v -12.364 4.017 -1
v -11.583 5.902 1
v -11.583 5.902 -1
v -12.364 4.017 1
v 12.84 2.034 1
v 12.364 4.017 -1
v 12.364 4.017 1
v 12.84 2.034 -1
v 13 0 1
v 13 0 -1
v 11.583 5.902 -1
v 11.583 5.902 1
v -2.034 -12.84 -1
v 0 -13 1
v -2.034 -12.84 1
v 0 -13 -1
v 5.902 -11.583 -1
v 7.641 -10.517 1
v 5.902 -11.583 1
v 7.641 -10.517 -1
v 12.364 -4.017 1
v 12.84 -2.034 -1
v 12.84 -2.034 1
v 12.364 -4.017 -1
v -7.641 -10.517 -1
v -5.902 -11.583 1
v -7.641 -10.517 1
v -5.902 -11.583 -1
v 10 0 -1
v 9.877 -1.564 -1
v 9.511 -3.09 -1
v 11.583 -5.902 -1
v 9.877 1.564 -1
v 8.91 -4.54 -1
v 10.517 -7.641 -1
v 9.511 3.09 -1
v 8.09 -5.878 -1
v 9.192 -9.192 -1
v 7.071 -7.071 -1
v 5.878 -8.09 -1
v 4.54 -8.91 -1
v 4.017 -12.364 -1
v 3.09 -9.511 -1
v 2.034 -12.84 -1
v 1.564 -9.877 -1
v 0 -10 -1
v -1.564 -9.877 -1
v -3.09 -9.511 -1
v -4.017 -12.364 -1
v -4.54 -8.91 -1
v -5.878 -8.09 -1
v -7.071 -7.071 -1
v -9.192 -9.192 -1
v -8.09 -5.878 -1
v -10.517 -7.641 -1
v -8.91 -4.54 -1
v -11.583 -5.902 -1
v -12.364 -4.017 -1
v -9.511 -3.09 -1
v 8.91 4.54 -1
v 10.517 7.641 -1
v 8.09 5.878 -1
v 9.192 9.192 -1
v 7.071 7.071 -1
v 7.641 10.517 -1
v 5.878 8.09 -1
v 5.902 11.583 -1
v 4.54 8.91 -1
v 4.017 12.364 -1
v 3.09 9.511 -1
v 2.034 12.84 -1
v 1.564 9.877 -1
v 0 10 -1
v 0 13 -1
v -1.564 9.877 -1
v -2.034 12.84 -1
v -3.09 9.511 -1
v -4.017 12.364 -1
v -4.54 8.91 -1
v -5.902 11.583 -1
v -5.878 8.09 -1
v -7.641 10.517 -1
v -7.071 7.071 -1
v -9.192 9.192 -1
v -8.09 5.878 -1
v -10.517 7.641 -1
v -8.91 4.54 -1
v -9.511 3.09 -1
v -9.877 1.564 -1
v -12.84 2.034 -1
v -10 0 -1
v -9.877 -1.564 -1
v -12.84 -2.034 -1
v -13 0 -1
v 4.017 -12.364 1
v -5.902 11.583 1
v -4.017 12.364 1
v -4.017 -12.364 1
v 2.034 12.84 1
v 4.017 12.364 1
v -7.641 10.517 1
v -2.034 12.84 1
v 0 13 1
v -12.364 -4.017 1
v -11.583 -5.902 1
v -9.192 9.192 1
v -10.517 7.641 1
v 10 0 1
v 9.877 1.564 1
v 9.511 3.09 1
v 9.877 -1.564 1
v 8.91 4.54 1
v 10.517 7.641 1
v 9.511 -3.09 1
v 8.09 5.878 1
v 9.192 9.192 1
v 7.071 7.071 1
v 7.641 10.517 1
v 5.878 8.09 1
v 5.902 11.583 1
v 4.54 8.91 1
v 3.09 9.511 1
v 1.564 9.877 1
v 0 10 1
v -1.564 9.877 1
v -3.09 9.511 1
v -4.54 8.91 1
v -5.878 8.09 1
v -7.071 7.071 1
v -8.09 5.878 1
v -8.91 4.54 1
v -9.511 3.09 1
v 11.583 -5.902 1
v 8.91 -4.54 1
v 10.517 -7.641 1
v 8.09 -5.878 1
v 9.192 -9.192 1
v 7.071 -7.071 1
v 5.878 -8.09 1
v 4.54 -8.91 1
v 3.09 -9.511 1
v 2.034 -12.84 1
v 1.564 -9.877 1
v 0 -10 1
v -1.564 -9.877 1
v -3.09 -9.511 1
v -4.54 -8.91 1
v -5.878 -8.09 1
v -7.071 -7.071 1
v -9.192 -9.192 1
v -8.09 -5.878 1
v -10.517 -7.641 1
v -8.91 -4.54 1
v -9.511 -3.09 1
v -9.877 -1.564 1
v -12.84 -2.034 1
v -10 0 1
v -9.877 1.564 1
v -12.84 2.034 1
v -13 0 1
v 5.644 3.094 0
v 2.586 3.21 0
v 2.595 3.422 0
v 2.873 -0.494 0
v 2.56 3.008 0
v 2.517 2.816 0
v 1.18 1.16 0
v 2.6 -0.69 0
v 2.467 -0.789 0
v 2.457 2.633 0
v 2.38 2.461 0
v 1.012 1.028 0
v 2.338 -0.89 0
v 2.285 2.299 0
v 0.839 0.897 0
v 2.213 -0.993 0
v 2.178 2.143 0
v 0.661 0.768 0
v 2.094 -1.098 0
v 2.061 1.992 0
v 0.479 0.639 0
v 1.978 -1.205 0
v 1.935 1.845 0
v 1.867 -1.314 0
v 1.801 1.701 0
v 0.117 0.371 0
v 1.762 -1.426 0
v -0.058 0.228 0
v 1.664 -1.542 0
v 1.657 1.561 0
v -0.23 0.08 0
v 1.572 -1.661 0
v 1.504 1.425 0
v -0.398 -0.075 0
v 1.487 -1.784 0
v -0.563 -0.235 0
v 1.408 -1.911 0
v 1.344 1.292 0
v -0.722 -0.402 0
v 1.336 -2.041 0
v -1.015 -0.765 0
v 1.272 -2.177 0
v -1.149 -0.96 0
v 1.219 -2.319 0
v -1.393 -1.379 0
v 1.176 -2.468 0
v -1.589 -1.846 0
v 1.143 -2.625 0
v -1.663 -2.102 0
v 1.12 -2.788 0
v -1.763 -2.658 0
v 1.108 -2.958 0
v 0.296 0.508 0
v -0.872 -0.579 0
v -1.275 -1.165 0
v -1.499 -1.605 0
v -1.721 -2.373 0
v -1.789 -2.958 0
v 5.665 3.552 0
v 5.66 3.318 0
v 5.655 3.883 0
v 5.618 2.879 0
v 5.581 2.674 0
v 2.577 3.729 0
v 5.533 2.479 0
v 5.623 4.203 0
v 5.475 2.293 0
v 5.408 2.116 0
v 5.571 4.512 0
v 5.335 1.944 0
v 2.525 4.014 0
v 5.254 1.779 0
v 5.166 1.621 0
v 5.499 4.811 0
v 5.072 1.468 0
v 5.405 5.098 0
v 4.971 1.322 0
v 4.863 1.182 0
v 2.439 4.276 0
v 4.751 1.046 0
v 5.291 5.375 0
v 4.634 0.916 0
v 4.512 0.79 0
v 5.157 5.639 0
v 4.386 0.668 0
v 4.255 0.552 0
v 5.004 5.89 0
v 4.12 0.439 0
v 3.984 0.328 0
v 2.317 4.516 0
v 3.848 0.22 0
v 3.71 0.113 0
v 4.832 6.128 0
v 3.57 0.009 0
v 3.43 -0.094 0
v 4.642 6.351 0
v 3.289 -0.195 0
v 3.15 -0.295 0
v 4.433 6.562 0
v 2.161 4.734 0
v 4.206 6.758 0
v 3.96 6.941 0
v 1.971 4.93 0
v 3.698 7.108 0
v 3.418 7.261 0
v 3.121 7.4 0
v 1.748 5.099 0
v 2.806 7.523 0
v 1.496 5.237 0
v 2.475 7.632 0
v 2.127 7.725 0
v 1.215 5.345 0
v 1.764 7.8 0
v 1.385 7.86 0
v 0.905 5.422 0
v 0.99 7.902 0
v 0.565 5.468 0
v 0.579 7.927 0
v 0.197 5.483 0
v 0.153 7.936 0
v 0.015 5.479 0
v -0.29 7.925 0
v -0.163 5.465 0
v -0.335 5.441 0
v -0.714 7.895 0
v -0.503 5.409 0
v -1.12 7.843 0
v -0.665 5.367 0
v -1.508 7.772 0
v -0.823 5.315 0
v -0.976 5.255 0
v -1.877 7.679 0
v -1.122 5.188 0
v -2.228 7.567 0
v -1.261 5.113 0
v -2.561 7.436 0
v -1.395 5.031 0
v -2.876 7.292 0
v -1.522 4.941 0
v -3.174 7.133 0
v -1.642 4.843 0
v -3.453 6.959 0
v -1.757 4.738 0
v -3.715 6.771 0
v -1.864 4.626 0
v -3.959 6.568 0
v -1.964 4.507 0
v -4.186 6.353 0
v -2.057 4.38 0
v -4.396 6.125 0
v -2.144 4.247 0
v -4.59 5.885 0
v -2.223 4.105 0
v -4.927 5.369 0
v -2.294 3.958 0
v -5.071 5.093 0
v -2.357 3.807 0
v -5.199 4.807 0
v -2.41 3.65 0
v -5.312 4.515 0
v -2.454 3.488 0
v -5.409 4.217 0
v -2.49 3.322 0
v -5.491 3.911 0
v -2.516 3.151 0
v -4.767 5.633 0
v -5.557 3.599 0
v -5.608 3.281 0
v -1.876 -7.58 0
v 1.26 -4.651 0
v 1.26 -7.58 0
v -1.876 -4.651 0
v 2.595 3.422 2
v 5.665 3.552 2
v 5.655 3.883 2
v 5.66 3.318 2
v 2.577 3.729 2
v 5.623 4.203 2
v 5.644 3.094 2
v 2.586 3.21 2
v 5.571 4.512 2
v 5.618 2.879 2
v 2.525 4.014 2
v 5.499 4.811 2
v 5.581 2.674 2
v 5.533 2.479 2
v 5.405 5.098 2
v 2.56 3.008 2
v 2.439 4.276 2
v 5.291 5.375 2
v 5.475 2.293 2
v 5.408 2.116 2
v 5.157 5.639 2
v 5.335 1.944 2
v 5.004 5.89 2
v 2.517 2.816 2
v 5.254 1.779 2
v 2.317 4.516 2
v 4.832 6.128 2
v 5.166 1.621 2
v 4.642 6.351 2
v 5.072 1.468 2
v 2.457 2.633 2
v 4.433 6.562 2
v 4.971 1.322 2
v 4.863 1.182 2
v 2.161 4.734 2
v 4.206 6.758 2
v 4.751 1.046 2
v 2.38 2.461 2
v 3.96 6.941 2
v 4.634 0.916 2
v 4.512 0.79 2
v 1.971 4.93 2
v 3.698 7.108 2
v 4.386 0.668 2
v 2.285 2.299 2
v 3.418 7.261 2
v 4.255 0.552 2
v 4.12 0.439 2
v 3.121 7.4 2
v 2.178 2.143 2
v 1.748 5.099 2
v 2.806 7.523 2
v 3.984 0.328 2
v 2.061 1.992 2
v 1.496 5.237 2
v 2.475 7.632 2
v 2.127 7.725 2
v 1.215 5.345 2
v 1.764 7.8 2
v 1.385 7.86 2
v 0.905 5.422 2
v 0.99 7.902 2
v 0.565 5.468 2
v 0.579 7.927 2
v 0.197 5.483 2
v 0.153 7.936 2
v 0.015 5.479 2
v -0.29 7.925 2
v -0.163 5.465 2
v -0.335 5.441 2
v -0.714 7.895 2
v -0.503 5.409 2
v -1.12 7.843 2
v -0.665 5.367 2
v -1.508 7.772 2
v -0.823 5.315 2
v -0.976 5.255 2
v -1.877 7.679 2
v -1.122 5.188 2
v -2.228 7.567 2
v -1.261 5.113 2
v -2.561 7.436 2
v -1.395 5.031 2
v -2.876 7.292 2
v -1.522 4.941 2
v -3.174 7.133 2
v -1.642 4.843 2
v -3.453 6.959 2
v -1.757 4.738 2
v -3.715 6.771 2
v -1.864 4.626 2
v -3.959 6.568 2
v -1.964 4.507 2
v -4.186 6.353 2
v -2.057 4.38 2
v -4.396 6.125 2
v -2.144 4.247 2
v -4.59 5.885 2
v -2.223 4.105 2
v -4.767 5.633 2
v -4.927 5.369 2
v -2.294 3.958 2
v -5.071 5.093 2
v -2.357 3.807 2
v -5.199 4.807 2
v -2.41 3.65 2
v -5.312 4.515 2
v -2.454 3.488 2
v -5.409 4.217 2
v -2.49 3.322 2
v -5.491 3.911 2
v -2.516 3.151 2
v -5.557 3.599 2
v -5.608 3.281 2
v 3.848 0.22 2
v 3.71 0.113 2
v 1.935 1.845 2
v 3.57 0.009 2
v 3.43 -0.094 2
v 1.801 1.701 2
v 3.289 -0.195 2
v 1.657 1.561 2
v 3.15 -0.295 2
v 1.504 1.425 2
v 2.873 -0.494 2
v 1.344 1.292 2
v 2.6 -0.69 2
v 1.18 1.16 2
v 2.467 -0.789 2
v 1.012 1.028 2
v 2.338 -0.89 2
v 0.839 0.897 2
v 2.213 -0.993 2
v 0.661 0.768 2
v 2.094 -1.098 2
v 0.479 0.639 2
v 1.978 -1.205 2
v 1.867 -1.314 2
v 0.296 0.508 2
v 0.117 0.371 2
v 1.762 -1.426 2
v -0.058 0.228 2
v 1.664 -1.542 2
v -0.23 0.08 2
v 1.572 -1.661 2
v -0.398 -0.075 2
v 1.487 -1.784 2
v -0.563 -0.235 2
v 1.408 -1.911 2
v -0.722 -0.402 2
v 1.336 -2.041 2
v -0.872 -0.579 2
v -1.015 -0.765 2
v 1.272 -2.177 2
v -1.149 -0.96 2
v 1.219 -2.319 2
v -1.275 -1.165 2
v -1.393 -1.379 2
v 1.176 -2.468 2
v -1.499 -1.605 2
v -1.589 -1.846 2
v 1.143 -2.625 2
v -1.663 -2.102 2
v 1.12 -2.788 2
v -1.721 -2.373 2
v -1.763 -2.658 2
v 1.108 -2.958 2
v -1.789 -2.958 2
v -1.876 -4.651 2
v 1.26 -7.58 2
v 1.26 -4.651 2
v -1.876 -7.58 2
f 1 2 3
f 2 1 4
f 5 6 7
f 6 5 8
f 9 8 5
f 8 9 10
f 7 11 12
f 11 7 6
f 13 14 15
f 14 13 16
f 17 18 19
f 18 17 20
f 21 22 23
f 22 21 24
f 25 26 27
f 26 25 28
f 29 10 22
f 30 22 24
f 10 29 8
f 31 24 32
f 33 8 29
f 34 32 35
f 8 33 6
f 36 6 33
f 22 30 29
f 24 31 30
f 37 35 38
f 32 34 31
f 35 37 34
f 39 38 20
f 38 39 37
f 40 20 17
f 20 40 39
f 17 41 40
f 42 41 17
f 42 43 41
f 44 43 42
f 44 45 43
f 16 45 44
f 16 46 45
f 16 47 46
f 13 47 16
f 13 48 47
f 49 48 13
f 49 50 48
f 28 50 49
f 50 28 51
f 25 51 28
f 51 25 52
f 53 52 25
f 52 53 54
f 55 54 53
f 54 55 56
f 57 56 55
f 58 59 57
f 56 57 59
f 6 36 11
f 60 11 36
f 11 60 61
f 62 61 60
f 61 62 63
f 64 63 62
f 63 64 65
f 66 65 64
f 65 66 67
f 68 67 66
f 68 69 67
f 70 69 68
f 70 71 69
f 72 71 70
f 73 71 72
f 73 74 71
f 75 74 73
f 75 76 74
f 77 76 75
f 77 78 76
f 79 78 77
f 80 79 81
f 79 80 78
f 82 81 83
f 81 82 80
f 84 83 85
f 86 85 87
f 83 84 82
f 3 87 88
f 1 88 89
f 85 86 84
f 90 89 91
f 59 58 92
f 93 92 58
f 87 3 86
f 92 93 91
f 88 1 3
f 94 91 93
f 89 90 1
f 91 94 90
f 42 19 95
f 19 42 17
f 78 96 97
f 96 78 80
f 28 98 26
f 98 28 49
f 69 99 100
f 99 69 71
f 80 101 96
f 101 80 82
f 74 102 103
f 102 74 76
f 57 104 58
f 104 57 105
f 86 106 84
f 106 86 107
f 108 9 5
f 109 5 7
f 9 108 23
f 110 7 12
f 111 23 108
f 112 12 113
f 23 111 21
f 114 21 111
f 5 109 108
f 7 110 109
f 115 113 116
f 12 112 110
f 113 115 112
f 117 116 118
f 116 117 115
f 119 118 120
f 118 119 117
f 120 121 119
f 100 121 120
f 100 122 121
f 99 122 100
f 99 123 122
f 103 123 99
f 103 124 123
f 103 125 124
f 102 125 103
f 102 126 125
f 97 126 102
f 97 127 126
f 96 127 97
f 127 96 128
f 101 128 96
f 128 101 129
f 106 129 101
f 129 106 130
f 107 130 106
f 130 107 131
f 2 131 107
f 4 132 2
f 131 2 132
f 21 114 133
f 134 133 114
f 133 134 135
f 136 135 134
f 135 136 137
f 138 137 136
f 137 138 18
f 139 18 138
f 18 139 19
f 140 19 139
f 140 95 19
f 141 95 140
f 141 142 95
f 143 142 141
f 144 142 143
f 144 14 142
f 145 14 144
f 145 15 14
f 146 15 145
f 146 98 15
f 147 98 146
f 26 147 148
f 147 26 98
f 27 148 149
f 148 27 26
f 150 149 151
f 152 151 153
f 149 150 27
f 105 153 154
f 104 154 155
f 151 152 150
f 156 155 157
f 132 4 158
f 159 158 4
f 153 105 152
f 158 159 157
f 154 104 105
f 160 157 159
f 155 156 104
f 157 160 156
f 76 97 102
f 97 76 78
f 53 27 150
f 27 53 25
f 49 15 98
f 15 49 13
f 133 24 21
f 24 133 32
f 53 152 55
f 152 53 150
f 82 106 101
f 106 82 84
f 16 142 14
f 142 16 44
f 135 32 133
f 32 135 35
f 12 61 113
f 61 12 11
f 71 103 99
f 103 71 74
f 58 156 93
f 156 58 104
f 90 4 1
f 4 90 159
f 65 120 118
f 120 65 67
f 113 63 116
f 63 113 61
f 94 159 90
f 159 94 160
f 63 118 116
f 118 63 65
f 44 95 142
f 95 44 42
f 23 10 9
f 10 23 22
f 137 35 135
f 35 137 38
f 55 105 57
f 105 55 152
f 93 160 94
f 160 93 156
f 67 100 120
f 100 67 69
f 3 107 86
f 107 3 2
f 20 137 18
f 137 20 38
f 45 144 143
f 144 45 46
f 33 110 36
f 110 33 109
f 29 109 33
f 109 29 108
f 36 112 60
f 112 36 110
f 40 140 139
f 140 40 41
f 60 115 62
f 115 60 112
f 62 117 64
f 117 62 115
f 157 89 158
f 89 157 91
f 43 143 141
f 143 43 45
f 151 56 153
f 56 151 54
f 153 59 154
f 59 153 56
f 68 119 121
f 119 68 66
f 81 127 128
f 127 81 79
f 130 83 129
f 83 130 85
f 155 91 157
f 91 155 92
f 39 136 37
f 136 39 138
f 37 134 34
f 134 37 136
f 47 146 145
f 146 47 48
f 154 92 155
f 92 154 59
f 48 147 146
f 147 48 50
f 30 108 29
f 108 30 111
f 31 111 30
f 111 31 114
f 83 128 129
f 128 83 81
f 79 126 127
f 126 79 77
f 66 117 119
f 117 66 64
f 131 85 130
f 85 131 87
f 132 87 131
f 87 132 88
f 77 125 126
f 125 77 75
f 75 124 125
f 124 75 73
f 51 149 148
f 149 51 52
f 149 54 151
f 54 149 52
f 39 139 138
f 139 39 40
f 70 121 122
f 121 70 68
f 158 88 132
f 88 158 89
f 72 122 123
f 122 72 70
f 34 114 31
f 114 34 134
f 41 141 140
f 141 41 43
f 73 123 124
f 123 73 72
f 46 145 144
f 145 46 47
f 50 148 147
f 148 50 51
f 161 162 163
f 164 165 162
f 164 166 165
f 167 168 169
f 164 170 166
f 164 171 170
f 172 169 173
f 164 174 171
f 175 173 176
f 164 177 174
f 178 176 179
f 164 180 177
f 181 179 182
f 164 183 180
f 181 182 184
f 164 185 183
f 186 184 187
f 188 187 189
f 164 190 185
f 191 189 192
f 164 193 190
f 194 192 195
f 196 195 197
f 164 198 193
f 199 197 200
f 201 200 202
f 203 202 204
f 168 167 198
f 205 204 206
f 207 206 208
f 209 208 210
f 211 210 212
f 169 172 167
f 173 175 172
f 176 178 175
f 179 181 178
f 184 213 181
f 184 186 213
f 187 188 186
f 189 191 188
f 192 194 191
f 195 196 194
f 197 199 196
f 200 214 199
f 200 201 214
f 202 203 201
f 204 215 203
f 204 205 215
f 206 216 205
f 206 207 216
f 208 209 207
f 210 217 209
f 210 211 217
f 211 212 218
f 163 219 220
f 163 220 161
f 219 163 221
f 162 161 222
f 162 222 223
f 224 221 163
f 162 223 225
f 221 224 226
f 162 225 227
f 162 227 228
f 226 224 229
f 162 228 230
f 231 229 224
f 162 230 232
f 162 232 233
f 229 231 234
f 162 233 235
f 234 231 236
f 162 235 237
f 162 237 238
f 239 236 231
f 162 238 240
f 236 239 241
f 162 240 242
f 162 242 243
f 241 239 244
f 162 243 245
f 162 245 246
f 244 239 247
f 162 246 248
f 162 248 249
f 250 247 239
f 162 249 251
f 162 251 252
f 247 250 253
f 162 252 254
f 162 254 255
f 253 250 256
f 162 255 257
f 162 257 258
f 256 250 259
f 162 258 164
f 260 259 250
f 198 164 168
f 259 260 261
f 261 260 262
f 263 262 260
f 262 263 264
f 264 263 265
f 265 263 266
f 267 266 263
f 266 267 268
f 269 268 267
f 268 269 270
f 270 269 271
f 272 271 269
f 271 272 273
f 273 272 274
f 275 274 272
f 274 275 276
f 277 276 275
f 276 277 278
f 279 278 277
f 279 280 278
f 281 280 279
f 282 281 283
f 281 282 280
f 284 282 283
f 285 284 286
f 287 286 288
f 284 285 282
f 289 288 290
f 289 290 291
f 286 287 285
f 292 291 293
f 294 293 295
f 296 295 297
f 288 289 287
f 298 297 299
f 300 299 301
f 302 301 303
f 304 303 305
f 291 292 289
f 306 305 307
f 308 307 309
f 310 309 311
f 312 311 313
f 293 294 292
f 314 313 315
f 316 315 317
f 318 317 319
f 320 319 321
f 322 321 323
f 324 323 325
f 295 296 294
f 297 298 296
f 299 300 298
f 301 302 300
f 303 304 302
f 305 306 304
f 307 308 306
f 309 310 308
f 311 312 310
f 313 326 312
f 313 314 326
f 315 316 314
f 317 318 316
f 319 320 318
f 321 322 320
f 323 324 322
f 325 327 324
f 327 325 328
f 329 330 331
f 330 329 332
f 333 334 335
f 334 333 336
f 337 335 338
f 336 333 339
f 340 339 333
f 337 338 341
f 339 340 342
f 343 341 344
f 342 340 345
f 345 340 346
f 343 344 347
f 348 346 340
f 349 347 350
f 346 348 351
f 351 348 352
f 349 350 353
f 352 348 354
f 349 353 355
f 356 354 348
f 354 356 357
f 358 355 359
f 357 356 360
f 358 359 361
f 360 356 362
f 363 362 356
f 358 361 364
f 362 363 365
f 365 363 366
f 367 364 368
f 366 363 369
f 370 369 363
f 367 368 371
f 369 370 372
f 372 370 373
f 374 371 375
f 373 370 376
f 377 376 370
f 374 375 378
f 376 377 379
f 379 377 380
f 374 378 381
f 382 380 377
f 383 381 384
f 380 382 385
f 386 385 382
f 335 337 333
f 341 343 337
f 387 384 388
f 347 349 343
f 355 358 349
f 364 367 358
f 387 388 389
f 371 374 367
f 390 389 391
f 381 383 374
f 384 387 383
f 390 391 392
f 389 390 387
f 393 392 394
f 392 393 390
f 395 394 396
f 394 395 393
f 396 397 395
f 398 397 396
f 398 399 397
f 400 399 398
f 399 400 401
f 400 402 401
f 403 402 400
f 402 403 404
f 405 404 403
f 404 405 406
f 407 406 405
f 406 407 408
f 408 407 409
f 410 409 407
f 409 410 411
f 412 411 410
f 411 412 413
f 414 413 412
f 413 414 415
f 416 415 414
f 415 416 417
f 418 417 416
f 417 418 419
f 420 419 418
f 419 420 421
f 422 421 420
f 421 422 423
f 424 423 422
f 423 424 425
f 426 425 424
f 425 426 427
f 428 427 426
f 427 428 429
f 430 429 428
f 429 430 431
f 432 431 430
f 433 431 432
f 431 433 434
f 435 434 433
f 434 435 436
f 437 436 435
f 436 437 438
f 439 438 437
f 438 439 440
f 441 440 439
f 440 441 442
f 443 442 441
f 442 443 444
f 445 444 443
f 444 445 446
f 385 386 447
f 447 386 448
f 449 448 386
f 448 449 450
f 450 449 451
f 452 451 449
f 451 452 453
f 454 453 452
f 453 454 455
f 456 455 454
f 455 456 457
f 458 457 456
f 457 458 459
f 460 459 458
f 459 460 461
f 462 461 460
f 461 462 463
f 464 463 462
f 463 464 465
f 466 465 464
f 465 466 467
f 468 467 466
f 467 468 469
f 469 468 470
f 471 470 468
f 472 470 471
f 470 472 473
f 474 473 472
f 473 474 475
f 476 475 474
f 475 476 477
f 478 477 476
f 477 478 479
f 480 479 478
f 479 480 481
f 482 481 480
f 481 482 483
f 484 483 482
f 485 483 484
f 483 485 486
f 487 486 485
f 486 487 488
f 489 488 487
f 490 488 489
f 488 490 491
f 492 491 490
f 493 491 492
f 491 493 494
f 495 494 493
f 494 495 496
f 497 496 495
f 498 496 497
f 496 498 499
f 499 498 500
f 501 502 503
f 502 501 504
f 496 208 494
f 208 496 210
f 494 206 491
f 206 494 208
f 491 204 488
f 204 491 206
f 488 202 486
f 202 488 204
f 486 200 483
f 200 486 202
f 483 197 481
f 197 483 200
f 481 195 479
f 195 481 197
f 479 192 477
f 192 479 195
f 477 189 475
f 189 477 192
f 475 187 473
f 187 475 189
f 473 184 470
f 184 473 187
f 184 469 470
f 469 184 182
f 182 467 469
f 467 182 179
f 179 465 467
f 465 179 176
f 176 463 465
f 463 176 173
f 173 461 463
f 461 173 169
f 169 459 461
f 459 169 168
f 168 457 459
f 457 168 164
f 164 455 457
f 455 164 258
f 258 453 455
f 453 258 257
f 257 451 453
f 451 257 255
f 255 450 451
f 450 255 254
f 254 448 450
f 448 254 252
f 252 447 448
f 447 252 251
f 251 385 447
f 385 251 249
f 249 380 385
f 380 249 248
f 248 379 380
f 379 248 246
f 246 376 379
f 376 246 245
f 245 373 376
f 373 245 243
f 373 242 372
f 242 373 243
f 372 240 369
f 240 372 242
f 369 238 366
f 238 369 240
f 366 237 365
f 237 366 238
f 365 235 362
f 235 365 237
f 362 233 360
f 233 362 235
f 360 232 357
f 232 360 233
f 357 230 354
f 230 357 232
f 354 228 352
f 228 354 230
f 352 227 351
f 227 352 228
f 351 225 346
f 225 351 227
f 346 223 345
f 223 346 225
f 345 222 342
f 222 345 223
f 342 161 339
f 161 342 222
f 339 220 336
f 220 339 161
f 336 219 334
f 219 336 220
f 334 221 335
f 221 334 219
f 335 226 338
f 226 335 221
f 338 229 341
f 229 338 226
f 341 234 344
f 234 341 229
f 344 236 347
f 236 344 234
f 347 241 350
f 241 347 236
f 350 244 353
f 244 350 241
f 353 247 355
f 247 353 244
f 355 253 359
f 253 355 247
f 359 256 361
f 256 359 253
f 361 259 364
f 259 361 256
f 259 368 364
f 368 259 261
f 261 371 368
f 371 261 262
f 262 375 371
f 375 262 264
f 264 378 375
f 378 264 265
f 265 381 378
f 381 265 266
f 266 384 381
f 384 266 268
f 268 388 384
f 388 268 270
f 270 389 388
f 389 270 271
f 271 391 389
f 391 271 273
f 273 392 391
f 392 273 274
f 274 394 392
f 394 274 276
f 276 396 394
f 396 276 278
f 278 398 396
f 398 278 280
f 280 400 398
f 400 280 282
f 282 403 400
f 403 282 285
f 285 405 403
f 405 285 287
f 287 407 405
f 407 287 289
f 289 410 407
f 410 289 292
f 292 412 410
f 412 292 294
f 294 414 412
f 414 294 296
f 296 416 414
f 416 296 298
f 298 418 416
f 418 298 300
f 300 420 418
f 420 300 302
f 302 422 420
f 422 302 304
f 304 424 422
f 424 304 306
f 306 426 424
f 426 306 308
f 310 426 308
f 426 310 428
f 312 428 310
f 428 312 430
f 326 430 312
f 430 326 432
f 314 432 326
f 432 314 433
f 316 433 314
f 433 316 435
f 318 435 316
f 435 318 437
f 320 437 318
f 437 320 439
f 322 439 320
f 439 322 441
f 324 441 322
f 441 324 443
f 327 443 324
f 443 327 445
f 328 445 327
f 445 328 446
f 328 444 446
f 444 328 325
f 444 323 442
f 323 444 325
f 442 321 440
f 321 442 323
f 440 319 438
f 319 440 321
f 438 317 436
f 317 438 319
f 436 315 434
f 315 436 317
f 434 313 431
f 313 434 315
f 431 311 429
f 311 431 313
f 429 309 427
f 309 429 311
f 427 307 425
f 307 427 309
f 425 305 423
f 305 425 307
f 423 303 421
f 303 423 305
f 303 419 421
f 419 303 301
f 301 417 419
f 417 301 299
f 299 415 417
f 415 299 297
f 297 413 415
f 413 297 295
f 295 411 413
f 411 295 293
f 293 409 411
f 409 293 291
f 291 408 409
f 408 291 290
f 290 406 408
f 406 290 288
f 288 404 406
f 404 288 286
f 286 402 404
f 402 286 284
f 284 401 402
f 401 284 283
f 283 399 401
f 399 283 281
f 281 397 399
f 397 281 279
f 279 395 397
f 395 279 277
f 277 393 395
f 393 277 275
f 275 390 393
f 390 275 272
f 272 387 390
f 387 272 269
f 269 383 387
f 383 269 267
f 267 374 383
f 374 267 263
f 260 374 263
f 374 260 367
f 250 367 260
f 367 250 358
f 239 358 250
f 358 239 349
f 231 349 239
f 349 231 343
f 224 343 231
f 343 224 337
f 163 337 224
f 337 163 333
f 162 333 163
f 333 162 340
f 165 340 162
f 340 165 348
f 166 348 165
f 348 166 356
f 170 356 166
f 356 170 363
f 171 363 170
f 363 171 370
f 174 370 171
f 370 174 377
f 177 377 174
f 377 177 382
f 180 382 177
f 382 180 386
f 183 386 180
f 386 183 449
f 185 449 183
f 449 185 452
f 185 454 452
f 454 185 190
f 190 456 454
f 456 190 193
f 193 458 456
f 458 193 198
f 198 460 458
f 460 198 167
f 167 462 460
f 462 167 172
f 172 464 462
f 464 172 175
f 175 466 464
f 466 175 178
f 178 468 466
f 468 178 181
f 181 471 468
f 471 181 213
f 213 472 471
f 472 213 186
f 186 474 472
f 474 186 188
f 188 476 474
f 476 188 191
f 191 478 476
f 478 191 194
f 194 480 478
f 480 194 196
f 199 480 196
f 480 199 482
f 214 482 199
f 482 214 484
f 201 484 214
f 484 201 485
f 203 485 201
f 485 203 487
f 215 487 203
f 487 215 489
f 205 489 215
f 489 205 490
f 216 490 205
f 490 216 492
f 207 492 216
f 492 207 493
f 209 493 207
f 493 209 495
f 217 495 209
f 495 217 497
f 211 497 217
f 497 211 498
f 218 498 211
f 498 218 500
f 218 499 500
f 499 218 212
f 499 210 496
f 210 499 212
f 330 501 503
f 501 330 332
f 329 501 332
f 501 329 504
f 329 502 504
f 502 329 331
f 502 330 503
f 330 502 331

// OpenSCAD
module OpenHelpPanelIcon() {
  difference() {
    cylinder(r = 13, h = 2, center = true);
    cylinder(r = 10, h = 4, center = true);
  }
  linear_extrude(2)
    text("?", halign = "center", valign = "center", size = 16,
         font="Liberation Sans:style=Bold");
}

OpenHelpPanelIcon($fn = 40);
